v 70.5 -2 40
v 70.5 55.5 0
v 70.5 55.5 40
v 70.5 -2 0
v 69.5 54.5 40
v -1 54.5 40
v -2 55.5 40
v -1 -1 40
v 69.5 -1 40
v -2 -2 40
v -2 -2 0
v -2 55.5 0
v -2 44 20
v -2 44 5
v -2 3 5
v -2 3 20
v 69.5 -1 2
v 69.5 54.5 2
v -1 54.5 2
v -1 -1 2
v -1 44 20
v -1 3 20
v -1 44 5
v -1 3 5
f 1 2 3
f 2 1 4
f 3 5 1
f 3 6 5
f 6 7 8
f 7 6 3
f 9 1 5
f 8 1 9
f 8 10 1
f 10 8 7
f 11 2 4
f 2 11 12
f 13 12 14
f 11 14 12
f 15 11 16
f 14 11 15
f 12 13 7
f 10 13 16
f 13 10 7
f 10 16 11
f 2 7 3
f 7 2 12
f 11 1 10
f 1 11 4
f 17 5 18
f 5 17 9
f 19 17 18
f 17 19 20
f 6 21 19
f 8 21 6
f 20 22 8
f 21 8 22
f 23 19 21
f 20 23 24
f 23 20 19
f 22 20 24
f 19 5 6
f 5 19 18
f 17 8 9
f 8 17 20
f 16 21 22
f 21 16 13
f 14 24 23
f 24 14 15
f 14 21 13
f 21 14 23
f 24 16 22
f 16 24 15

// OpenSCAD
difference() {
union() {

color("green") translate([-2,-2,0])cube([72.5,57.5,40]);
}
translate([-1,-1,2])cube([70.5,55.5,42]);
translate([-5,3,5]) cube([10,41,15]);
}
